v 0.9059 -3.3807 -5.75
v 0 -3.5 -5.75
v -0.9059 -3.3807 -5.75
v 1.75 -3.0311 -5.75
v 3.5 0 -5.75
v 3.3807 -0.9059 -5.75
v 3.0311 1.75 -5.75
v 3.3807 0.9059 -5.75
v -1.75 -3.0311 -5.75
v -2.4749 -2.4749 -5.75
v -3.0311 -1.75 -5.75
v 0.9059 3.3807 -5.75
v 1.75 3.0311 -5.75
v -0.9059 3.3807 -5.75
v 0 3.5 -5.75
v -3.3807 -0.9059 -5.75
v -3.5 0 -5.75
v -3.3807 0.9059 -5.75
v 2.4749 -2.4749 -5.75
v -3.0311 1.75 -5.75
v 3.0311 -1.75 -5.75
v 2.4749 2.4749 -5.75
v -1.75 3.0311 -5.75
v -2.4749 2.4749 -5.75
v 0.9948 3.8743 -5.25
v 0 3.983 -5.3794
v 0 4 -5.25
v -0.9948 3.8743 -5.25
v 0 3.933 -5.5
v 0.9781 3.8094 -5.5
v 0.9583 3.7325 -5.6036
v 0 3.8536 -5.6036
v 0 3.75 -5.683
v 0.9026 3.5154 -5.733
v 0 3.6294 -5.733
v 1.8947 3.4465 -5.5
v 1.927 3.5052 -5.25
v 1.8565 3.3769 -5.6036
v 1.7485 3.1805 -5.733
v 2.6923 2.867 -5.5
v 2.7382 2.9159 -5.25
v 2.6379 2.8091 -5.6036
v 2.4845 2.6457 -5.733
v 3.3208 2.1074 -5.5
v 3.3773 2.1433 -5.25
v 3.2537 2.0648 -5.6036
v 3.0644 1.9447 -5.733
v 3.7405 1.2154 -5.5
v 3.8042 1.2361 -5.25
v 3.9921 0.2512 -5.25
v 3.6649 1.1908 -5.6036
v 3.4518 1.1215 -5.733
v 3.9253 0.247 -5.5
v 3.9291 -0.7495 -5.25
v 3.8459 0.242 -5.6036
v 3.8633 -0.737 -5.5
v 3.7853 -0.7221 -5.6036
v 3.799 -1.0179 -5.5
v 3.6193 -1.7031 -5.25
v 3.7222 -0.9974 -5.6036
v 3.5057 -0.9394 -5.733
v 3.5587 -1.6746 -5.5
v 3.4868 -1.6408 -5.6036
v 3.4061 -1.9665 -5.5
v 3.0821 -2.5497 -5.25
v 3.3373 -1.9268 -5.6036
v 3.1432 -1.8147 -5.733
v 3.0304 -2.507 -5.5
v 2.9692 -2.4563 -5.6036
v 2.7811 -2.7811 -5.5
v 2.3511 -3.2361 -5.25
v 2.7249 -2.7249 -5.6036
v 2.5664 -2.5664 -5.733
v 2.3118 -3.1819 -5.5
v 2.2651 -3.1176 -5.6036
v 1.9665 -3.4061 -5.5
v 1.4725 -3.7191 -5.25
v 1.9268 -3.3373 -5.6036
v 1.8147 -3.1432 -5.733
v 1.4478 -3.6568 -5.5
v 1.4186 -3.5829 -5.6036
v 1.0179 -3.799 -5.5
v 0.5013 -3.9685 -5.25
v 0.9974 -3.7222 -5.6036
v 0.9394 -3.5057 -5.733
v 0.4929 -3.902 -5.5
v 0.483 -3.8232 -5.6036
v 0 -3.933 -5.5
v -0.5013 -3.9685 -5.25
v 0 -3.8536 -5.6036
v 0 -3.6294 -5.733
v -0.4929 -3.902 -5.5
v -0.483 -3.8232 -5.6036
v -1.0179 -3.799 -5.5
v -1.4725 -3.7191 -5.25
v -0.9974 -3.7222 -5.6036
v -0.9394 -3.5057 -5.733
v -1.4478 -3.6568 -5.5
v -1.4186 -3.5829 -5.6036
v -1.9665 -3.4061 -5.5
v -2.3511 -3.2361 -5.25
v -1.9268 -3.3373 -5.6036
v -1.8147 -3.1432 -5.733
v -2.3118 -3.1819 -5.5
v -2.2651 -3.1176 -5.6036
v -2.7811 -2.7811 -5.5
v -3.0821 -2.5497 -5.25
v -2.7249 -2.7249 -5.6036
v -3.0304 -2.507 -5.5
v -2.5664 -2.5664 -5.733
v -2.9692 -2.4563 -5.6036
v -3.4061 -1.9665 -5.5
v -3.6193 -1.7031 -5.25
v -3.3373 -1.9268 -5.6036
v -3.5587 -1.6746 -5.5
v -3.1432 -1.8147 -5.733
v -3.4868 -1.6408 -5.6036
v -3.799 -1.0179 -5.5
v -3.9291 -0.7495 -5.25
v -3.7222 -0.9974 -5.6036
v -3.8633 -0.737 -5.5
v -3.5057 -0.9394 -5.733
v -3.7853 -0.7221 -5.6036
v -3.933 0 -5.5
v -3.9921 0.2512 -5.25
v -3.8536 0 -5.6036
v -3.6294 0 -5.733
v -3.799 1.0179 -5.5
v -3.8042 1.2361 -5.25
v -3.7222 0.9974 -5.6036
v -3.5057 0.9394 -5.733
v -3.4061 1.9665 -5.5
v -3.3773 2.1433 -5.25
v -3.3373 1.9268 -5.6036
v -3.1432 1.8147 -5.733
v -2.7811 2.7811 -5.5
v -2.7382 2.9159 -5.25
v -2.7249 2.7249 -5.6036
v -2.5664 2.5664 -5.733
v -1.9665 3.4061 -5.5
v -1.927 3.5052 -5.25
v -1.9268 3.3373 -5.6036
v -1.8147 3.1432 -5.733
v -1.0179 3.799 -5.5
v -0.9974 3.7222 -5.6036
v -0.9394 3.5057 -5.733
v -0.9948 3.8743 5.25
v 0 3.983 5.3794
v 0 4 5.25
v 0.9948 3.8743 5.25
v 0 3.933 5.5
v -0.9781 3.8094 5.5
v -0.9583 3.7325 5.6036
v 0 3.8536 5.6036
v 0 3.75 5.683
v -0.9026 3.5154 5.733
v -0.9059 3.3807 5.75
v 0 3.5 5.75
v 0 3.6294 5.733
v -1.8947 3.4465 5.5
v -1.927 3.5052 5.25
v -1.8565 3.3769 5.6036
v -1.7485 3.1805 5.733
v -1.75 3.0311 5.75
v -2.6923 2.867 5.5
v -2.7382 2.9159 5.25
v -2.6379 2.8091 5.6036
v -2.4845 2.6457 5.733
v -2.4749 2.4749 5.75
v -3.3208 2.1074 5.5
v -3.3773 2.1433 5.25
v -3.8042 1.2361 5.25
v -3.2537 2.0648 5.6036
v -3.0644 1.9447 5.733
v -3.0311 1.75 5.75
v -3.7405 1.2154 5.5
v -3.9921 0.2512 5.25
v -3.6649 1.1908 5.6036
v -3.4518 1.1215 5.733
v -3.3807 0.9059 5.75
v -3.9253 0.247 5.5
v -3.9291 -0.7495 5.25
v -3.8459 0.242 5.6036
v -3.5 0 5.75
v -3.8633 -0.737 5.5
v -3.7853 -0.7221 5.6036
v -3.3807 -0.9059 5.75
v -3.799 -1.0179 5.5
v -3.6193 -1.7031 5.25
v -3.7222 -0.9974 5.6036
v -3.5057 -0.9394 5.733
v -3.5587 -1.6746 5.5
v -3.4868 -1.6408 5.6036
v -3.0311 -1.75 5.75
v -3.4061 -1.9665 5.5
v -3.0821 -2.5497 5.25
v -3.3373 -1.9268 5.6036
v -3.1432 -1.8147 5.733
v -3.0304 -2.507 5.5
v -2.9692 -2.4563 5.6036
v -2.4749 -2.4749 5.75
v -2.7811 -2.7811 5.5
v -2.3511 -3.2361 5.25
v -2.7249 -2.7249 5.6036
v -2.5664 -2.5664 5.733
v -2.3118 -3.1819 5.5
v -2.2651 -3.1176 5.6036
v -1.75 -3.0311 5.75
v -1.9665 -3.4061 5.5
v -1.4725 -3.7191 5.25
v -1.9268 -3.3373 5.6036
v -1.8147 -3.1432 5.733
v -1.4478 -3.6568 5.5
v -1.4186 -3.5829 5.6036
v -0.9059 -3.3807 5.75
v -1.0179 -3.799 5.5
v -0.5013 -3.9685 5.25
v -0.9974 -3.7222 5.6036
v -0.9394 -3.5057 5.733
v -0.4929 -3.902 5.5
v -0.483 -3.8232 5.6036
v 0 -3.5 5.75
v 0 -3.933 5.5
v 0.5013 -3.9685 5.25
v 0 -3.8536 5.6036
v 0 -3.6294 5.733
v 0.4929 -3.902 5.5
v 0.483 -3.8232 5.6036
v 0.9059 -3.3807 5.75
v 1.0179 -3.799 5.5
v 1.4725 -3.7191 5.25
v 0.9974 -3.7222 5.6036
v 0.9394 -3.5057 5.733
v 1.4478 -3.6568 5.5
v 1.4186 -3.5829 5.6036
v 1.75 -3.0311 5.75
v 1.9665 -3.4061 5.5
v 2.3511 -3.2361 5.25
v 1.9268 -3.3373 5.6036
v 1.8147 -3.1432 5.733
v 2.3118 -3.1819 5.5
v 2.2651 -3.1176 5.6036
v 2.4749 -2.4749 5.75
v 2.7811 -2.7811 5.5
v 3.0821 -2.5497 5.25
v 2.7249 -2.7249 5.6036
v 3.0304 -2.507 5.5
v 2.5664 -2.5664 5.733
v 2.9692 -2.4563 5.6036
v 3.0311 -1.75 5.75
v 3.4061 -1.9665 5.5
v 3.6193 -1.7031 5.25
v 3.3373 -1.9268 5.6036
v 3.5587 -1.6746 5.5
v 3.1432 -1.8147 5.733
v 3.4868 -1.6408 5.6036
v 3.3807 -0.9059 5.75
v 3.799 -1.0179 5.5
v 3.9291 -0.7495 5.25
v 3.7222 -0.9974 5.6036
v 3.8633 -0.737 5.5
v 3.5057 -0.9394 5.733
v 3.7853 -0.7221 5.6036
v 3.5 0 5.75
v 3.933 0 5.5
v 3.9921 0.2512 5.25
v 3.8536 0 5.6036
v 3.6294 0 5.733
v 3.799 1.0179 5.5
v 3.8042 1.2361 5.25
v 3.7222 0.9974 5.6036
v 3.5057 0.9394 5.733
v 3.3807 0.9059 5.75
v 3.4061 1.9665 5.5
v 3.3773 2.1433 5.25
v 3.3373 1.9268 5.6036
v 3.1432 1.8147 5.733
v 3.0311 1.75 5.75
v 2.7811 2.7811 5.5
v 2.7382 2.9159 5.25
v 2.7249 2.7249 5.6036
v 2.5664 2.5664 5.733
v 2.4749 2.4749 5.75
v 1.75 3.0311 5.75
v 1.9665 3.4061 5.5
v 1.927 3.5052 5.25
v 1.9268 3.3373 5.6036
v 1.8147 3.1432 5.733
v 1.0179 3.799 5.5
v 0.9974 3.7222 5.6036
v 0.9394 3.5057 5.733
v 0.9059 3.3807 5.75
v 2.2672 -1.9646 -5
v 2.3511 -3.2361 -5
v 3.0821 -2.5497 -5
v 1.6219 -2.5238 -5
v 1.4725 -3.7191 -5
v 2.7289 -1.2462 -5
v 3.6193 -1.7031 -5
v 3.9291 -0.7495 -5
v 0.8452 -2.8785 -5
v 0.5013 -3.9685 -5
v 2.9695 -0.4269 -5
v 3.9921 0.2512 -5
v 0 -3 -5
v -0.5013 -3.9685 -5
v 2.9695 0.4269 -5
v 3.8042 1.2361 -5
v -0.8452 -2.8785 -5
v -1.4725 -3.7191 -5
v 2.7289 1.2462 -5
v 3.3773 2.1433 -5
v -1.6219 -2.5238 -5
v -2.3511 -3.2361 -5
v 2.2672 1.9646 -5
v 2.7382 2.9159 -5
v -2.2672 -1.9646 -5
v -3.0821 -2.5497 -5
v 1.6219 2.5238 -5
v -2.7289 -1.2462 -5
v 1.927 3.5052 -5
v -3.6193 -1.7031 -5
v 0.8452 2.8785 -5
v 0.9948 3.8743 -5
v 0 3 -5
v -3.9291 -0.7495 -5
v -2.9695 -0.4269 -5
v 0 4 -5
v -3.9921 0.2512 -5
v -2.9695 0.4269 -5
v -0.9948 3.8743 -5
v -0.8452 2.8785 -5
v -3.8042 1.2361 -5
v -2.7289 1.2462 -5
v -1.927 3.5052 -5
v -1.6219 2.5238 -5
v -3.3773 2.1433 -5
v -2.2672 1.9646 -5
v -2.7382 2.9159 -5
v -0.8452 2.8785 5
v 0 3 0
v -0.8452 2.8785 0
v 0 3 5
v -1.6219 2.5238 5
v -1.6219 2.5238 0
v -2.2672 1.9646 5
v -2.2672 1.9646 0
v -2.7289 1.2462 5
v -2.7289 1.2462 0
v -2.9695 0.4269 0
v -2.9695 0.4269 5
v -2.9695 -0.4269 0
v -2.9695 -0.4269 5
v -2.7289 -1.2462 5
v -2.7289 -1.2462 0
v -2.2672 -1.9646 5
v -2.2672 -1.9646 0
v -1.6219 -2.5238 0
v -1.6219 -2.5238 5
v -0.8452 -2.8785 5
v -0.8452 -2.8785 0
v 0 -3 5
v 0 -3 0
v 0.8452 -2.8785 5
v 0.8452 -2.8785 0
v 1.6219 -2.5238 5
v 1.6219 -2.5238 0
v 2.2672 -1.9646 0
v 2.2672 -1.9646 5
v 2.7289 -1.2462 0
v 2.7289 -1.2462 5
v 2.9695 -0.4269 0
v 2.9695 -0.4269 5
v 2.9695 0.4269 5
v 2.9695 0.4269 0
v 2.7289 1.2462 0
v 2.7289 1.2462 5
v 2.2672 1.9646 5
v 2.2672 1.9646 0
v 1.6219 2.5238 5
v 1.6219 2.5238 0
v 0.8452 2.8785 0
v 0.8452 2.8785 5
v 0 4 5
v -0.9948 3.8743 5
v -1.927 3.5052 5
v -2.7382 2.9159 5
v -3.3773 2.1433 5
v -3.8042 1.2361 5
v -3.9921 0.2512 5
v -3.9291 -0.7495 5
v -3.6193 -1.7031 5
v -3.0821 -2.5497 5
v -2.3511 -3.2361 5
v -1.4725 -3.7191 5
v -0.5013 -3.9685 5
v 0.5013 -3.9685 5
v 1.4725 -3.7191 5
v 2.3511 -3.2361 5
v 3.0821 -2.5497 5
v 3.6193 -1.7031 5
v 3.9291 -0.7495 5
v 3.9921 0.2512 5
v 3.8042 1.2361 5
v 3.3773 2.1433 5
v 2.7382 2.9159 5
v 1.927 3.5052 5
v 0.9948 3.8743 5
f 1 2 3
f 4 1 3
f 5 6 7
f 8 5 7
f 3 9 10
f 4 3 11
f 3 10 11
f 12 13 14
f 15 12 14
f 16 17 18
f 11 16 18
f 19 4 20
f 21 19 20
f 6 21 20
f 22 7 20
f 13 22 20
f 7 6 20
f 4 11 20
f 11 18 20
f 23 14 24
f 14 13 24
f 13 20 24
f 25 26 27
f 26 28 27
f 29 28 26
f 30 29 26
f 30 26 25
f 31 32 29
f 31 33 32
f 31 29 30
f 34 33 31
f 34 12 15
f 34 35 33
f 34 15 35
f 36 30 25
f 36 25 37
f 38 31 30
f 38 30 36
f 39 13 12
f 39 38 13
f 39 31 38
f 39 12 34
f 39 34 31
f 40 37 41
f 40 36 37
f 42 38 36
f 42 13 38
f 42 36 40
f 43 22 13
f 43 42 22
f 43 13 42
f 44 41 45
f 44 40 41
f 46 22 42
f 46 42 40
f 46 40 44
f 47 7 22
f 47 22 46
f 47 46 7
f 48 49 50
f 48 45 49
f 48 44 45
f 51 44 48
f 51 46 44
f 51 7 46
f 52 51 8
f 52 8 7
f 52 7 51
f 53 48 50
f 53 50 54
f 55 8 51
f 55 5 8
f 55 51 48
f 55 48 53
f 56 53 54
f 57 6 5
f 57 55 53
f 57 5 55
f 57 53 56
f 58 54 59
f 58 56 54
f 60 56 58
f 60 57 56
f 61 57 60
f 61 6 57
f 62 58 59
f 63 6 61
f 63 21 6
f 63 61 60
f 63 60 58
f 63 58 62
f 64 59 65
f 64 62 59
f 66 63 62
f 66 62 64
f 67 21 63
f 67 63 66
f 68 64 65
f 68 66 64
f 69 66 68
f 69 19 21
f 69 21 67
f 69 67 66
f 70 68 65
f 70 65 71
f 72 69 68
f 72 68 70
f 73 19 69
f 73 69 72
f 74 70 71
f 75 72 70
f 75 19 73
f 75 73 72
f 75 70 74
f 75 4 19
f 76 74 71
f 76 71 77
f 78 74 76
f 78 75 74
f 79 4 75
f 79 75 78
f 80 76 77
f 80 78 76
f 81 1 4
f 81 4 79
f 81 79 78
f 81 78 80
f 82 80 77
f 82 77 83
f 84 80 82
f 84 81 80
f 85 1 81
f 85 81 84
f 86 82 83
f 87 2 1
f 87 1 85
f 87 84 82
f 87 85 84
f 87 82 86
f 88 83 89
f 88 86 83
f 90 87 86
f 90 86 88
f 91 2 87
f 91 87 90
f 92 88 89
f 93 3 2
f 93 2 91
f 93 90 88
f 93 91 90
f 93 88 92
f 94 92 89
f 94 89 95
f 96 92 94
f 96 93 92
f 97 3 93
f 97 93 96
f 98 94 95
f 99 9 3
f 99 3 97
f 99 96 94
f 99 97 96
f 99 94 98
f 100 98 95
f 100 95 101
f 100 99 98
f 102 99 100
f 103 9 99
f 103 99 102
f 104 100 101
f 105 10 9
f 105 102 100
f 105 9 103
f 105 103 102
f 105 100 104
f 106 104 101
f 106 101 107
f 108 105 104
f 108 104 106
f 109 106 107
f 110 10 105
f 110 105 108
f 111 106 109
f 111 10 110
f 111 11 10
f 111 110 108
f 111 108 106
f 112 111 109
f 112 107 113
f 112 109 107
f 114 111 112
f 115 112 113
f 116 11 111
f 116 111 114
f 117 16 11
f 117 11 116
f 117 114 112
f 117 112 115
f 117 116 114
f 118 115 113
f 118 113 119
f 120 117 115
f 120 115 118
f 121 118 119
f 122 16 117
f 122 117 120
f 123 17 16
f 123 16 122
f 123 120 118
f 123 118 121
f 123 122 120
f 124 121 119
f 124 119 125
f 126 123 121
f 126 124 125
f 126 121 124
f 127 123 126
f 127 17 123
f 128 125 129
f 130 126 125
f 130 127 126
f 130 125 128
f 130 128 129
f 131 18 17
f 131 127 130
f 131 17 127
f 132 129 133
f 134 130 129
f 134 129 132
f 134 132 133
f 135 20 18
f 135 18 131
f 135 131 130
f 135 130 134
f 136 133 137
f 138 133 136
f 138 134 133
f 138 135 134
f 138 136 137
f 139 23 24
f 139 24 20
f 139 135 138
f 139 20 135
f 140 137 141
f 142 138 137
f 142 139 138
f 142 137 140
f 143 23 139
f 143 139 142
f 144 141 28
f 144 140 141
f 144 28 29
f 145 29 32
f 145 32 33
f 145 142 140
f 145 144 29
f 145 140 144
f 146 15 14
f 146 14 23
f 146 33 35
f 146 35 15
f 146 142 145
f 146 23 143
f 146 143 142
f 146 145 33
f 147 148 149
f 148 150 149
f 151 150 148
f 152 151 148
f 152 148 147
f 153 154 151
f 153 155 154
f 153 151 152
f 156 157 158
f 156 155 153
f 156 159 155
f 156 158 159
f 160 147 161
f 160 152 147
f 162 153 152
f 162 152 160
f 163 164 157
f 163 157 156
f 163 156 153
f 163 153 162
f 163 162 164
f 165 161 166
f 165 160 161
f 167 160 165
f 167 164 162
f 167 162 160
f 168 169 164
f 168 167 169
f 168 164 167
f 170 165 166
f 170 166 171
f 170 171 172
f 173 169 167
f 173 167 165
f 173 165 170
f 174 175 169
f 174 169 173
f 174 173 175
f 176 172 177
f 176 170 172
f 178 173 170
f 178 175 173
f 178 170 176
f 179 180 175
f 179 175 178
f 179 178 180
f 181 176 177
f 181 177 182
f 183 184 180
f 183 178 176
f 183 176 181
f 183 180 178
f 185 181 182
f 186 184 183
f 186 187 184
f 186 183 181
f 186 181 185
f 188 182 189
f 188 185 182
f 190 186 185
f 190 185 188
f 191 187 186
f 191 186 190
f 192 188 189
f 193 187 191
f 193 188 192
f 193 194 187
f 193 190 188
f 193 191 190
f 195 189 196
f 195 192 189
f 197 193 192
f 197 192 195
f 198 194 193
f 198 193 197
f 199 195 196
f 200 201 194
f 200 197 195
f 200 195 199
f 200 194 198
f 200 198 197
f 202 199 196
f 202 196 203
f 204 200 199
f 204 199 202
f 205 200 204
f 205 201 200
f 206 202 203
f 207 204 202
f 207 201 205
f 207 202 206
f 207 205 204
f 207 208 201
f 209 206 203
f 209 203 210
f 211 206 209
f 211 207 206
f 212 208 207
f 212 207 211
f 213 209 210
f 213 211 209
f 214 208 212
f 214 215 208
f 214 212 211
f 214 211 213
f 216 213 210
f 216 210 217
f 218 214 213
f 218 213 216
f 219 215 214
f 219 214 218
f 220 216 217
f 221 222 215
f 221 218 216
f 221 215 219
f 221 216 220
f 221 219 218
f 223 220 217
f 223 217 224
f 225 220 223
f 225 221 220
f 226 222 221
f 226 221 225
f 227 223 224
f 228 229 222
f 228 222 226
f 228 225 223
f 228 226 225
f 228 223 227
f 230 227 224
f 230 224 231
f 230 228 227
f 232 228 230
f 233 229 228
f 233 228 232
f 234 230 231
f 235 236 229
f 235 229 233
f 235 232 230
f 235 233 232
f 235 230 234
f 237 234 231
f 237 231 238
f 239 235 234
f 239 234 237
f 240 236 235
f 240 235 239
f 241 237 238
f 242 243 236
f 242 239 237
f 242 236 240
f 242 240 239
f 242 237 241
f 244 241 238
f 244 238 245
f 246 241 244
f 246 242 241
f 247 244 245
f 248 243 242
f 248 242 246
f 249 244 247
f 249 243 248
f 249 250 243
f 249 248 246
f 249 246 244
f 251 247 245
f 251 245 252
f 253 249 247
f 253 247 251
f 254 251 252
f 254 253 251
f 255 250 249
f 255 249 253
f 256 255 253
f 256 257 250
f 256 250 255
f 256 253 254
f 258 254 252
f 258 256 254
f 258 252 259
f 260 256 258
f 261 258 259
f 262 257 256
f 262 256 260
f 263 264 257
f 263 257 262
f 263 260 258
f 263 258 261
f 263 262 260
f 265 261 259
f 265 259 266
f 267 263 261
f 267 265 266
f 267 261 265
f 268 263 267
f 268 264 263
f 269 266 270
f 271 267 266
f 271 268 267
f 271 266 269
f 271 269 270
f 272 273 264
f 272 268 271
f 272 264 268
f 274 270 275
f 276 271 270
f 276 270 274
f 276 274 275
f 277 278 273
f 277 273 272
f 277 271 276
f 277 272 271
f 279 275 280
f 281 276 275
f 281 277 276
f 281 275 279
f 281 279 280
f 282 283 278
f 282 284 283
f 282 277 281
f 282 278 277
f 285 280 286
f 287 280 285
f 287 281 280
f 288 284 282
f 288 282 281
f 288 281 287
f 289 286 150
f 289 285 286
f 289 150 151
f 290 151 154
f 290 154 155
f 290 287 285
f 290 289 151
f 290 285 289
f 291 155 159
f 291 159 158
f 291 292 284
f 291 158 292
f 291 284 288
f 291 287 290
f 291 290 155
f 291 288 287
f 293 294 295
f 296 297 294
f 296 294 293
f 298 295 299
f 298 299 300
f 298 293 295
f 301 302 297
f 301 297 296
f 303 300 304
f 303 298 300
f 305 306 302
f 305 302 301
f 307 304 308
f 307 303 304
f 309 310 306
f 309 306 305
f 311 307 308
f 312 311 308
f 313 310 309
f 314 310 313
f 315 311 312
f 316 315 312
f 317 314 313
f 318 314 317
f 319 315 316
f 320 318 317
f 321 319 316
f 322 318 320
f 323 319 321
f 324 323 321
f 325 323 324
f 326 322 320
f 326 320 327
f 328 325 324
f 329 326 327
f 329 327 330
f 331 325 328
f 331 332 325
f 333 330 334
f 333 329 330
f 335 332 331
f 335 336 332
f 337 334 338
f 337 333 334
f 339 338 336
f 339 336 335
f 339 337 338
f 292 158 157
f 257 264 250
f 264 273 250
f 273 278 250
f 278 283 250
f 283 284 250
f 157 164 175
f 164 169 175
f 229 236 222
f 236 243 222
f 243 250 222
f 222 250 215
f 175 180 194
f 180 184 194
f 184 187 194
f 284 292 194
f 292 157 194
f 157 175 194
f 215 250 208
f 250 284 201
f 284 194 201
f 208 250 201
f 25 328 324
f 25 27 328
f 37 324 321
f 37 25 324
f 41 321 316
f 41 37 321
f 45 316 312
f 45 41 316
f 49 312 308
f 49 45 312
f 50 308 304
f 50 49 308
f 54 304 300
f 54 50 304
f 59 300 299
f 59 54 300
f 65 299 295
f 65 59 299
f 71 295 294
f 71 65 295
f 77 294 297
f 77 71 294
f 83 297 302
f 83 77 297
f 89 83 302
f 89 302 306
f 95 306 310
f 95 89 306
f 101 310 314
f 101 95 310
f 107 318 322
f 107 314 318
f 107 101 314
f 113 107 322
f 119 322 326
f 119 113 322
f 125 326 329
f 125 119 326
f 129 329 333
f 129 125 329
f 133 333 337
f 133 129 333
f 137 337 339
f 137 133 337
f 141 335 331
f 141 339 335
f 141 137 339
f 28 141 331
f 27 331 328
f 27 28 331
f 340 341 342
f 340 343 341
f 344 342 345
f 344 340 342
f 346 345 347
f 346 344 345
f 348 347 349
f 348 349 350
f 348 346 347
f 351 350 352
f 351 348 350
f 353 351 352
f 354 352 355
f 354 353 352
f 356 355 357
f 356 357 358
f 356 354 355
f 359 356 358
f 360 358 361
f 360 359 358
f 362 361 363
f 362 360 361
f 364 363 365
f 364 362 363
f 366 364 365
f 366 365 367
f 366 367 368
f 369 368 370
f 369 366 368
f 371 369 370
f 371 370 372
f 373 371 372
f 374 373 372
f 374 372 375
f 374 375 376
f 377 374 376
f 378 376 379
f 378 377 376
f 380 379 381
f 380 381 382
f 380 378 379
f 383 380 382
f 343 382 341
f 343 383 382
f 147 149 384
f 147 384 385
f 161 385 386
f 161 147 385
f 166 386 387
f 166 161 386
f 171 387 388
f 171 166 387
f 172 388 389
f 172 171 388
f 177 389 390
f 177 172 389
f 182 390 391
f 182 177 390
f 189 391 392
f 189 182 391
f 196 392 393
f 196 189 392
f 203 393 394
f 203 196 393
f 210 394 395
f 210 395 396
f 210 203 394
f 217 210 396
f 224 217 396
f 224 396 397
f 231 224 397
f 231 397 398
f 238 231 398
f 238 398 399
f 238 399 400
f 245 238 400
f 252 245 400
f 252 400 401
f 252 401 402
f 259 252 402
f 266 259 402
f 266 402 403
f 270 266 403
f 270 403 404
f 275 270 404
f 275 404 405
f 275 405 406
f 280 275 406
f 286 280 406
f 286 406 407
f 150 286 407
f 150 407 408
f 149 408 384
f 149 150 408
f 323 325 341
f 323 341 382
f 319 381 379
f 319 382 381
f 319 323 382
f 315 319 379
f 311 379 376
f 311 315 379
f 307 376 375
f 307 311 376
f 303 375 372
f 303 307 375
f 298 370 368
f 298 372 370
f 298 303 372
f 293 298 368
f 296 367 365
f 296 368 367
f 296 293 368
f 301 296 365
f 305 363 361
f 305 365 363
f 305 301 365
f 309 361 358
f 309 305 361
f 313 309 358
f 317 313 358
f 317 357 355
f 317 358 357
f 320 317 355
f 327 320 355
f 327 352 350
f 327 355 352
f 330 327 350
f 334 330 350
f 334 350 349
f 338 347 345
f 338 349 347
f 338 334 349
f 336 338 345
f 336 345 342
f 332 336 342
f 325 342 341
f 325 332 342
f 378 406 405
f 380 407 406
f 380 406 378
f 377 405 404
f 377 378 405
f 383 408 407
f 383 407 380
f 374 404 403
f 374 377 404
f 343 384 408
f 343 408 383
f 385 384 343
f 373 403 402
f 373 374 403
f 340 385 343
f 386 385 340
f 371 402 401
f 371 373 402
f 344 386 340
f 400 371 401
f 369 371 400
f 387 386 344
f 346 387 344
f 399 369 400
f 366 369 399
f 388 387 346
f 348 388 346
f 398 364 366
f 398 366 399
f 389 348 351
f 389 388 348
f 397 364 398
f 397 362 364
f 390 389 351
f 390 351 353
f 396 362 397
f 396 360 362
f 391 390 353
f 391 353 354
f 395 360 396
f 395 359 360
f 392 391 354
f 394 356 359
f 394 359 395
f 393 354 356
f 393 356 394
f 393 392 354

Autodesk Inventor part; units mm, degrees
ref_plane "YZ Plane" through (0, 0, 0) normal (1, 0, 0) x (0, 1, 0)
ref_plane "XZ Plane" through (0, 0, 0) normal (0, 1, 0) x (-1, 0, 0)
ref_plane "XY Plane" through (0, 0, 0) normal (0, 0, 1) x (1, 0, 0)
sketch "Sketch4" plane through (0, 0, 0) normal (1, 0, 0) x (0, 1, 0)
  line L0 (0, 0) -> (3, 0)
  line L1 (3, 0) -> (3, -5)
  line L2 (3, -5) -> (4, -5)
  line L3 (4, -5) -> (4, -5.75)
  line L4 (4, -5.75) -> (0, -5.75)
  line L5 (0, -5.75) -> (0, 0)
  dimension "d32" = 3
  dimension "d33" = 5
  dimension "d35" = 4
  dimension "d36" = 0.75
revolve "Revolution2" add sketch "Sketch4" angle 360 about axis through (0, 0, -5.75) along (0, 0, 1)
fillet "Fillet1" radius 0.5 1 edges at (0, -4, -5.75)
mirror "Mirror1" about plane through (0, 3, 0) normal (0, 0, 1) of "Revolution2", "Fillet1"
sketch "Boceto5" plane through (0, 0, 5.75) normal (0, 0, 1) x (1, 0, 0)
  circle A0 centre (0, 0) radius 3 projected
properties part number "Sketch" material "Acero, alta resistencia, aleación baja"
